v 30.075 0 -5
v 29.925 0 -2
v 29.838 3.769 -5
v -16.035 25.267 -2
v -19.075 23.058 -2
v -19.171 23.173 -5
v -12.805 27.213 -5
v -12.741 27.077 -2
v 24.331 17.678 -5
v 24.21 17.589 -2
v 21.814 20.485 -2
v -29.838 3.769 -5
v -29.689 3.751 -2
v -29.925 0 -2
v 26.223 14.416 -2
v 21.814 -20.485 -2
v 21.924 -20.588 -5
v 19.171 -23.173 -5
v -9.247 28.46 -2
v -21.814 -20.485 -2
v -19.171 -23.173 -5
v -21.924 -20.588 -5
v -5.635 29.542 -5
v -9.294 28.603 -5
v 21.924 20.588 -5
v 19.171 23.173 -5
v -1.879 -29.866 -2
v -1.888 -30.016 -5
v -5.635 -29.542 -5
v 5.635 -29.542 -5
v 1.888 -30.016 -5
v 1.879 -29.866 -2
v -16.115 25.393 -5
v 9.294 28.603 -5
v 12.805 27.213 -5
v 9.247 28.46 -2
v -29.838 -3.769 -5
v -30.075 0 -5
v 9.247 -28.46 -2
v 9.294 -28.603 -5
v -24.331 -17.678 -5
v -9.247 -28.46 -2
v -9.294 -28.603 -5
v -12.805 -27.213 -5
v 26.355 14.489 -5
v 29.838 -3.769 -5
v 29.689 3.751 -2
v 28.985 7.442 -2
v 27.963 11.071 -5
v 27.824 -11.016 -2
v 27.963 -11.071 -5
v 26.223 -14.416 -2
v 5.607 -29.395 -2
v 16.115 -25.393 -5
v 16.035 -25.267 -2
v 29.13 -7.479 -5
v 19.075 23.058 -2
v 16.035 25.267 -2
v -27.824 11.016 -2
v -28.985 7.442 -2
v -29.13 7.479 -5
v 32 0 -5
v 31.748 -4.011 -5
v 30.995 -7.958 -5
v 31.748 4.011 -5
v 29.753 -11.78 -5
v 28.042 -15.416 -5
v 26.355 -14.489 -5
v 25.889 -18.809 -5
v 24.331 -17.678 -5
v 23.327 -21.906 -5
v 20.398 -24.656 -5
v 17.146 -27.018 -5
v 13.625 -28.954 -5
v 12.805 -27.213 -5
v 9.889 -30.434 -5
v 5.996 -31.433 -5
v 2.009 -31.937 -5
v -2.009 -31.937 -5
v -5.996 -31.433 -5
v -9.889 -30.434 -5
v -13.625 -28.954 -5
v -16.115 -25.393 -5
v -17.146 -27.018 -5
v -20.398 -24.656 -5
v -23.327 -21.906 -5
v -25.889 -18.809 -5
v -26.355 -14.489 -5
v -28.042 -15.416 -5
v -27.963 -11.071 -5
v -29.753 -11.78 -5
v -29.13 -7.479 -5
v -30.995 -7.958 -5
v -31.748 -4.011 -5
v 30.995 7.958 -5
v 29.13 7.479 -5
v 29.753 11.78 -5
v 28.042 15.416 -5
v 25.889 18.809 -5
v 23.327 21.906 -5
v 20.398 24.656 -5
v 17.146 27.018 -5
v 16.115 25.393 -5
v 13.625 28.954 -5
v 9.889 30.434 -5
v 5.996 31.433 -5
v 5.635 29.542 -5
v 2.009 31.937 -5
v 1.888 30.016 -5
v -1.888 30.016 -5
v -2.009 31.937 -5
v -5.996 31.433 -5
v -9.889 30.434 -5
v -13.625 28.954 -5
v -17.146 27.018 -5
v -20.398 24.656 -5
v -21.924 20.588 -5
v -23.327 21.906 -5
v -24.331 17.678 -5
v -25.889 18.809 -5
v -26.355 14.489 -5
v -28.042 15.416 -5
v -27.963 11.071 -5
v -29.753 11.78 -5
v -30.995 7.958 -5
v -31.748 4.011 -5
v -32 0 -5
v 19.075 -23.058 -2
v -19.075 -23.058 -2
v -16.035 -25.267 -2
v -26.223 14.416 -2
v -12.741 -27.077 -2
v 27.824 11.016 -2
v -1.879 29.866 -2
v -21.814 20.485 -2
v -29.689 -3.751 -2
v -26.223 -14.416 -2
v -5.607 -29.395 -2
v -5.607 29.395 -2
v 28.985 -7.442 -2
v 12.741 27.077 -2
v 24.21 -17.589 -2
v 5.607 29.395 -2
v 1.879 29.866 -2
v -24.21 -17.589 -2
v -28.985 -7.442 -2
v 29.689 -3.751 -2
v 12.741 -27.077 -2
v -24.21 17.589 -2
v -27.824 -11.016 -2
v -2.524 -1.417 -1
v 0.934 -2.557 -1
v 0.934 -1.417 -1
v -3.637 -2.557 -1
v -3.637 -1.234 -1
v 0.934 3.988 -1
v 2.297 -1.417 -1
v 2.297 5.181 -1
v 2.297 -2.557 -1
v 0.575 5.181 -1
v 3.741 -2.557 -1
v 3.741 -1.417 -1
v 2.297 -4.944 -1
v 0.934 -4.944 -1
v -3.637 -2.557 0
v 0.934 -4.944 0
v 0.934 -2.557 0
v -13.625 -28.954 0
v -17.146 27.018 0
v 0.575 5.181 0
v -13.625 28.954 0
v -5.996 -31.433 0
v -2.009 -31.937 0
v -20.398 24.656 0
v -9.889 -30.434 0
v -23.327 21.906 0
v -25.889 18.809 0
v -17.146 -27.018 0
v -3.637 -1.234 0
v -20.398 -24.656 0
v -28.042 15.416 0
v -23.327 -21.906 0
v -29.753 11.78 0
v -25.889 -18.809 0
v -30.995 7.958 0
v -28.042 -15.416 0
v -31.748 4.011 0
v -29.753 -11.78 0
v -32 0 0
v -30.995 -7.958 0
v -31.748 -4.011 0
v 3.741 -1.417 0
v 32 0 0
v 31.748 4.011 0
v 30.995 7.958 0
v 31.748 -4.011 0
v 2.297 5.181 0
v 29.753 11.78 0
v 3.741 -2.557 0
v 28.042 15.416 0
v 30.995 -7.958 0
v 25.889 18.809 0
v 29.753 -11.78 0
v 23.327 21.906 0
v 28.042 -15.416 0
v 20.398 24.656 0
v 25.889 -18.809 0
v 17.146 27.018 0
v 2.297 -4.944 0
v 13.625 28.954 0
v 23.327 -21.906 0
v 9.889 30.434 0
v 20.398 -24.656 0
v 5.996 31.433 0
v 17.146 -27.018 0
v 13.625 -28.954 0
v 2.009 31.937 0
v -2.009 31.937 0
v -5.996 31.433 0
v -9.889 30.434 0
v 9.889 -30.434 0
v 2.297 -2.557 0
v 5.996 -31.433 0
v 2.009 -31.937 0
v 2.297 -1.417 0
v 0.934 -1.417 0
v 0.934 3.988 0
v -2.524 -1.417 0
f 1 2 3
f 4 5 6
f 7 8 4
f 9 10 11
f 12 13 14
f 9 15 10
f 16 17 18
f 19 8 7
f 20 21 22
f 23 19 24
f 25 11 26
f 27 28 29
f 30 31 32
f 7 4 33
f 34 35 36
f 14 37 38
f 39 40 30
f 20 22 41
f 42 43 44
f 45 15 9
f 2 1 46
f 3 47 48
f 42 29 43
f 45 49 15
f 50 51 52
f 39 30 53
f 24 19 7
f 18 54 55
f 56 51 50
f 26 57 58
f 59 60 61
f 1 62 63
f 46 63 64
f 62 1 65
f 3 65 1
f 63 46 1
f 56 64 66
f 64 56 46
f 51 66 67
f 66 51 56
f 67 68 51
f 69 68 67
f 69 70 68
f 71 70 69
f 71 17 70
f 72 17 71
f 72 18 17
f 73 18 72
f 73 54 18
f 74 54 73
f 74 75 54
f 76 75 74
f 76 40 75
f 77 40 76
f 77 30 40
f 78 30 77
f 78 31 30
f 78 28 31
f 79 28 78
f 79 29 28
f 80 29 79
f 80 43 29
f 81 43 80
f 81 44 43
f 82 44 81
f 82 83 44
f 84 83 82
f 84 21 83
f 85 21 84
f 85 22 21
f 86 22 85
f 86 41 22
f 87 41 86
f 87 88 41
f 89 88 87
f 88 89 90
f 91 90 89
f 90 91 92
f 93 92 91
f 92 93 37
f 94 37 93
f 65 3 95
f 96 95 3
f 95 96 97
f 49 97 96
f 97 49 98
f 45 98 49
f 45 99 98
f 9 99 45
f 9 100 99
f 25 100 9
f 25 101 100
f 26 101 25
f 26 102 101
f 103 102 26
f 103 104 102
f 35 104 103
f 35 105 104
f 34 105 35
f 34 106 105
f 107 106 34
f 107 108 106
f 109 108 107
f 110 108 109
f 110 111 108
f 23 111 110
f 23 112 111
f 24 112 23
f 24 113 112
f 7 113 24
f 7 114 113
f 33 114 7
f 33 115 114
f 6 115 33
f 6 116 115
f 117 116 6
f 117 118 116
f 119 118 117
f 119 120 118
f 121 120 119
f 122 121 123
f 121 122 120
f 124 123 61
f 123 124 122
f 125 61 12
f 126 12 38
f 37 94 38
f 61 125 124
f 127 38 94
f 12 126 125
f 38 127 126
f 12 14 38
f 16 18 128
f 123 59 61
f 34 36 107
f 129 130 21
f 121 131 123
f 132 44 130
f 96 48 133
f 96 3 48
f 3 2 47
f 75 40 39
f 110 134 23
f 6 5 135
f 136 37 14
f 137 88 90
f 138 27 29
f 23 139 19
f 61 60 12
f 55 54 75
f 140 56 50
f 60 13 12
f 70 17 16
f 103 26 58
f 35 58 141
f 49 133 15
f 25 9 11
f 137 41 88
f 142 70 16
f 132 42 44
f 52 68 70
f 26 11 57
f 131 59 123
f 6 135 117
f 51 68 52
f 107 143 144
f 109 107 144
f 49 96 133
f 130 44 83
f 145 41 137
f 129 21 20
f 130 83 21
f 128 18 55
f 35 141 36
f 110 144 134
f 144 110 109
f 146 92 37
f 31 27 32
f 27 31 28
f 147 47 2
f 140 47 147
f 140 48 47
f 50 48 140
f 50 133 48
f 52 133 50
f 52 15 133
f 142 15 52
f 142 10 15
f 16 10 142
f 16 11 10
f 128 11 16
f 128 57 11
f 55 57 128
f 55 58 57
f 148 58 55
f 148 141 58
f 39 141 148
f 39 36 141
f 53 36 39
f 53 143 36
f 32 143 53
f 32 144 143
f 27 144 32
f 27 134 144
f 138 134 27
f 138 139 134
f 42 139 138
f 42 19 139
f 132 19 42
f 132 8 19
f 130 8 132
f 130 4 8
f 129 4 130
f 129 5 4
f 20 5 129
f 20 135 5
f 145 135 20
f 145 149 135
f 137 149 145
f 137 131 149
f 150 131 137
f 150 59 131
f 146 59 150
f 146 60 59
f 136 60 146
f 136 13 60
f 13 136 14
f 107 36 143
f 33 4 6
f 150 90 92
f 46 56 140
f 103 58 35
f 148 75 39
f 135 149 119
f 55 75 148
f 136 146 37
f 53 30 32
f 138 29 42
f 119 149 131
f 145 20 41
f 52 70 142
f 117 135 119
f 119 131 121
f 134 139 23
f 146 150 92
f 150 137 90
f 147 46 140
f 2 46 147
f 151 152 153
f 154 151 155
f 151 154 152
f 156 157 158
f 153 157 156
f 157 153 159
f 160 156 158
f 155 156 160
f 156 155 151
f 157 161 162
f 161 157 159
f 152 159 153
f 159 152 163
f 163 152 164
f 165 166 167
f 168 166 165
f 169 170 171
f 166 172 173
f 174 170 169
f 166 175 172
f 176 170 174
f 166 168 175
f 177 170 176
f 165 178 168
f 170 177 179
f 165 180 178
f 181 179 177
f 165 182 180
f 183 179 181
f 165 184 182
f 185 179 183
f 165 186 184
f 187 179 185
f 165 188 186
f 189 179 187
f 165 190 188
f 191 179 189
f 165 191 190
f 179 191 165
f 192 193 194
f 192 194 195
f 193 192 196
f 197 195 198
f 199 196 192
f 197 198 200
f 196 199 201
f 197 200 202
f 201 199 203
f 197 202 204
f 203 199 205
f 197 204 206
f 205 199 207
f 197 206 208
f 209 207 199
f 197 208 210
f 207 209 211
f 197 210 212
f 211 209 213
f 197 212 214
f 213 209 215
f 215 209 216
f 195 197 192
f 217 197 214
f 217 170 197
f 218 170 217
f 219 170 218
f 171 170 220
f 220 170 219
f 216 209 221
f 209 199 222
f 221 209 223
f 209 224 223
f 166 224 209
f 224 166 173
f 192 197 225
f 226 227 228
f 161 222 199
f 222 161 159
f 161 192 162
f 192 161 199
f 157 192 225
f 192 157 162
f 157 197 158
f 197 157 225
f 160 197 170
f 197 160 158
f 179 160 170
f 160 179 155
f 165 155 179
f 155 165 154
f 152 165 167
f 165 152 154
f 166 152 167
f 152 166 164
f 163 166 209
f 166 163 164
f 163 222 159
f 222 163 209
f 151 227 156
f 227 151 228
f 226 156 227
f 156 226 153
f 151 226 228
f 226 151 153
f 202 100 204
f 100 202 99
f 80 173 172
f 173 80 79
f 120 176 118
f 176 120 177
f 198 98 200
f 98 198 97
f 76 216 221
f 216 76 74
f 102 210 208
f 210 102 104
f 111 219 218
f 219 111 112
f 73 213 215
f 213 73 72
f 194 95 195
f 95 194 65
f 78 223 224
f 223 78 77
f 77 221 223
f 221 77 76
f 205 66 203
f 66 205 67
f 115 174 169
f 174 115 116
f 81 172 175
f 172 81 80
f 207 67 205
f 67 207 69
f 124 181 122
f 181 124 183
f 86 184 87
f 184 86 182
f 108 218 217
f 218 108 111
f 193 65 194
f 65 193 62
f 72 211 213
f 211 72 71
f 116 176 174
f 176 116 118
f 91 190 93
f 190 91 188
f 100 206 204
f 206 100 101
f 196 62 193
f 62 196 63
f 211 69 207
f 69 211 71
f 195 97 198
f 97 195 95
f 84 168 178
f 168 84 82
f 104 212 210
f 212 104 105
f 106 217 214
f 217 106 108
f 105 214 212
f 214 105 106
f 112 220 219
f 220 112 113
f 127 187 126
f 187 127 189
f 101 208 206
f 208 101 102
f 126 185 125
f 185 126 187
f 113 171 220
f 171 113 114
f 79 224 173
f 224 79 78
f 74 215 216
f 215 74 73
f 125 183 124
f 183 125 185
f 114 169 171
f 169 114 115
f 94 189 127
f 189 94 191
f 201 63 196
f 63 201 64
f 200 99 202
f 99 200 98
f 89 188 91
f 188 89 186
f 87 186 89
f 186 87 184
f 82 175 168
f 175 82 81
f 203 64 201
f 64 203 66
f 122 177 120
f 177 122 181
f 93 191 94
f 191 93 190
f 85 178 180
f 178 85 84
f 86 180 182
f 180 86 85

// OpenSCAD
$fn = 50;

difference() {
	union() {
		translate(v = [0, 0, -5.0]) {
			cylinder(h = 5, r = 32.0);
		}
	}
	union() {
		#translate(v = [0, 0, -5.0]) {
			cylinder(h = 3, r1 = 30.075, r2 = 29.925);
		}
		translate(v = [0, 0, -1]) {
			linear_extrude(height = 1) {
				text(font = "Impact", halign = "center", size = 10, text = "4", valign = "center");
			}
		}
	}
}
